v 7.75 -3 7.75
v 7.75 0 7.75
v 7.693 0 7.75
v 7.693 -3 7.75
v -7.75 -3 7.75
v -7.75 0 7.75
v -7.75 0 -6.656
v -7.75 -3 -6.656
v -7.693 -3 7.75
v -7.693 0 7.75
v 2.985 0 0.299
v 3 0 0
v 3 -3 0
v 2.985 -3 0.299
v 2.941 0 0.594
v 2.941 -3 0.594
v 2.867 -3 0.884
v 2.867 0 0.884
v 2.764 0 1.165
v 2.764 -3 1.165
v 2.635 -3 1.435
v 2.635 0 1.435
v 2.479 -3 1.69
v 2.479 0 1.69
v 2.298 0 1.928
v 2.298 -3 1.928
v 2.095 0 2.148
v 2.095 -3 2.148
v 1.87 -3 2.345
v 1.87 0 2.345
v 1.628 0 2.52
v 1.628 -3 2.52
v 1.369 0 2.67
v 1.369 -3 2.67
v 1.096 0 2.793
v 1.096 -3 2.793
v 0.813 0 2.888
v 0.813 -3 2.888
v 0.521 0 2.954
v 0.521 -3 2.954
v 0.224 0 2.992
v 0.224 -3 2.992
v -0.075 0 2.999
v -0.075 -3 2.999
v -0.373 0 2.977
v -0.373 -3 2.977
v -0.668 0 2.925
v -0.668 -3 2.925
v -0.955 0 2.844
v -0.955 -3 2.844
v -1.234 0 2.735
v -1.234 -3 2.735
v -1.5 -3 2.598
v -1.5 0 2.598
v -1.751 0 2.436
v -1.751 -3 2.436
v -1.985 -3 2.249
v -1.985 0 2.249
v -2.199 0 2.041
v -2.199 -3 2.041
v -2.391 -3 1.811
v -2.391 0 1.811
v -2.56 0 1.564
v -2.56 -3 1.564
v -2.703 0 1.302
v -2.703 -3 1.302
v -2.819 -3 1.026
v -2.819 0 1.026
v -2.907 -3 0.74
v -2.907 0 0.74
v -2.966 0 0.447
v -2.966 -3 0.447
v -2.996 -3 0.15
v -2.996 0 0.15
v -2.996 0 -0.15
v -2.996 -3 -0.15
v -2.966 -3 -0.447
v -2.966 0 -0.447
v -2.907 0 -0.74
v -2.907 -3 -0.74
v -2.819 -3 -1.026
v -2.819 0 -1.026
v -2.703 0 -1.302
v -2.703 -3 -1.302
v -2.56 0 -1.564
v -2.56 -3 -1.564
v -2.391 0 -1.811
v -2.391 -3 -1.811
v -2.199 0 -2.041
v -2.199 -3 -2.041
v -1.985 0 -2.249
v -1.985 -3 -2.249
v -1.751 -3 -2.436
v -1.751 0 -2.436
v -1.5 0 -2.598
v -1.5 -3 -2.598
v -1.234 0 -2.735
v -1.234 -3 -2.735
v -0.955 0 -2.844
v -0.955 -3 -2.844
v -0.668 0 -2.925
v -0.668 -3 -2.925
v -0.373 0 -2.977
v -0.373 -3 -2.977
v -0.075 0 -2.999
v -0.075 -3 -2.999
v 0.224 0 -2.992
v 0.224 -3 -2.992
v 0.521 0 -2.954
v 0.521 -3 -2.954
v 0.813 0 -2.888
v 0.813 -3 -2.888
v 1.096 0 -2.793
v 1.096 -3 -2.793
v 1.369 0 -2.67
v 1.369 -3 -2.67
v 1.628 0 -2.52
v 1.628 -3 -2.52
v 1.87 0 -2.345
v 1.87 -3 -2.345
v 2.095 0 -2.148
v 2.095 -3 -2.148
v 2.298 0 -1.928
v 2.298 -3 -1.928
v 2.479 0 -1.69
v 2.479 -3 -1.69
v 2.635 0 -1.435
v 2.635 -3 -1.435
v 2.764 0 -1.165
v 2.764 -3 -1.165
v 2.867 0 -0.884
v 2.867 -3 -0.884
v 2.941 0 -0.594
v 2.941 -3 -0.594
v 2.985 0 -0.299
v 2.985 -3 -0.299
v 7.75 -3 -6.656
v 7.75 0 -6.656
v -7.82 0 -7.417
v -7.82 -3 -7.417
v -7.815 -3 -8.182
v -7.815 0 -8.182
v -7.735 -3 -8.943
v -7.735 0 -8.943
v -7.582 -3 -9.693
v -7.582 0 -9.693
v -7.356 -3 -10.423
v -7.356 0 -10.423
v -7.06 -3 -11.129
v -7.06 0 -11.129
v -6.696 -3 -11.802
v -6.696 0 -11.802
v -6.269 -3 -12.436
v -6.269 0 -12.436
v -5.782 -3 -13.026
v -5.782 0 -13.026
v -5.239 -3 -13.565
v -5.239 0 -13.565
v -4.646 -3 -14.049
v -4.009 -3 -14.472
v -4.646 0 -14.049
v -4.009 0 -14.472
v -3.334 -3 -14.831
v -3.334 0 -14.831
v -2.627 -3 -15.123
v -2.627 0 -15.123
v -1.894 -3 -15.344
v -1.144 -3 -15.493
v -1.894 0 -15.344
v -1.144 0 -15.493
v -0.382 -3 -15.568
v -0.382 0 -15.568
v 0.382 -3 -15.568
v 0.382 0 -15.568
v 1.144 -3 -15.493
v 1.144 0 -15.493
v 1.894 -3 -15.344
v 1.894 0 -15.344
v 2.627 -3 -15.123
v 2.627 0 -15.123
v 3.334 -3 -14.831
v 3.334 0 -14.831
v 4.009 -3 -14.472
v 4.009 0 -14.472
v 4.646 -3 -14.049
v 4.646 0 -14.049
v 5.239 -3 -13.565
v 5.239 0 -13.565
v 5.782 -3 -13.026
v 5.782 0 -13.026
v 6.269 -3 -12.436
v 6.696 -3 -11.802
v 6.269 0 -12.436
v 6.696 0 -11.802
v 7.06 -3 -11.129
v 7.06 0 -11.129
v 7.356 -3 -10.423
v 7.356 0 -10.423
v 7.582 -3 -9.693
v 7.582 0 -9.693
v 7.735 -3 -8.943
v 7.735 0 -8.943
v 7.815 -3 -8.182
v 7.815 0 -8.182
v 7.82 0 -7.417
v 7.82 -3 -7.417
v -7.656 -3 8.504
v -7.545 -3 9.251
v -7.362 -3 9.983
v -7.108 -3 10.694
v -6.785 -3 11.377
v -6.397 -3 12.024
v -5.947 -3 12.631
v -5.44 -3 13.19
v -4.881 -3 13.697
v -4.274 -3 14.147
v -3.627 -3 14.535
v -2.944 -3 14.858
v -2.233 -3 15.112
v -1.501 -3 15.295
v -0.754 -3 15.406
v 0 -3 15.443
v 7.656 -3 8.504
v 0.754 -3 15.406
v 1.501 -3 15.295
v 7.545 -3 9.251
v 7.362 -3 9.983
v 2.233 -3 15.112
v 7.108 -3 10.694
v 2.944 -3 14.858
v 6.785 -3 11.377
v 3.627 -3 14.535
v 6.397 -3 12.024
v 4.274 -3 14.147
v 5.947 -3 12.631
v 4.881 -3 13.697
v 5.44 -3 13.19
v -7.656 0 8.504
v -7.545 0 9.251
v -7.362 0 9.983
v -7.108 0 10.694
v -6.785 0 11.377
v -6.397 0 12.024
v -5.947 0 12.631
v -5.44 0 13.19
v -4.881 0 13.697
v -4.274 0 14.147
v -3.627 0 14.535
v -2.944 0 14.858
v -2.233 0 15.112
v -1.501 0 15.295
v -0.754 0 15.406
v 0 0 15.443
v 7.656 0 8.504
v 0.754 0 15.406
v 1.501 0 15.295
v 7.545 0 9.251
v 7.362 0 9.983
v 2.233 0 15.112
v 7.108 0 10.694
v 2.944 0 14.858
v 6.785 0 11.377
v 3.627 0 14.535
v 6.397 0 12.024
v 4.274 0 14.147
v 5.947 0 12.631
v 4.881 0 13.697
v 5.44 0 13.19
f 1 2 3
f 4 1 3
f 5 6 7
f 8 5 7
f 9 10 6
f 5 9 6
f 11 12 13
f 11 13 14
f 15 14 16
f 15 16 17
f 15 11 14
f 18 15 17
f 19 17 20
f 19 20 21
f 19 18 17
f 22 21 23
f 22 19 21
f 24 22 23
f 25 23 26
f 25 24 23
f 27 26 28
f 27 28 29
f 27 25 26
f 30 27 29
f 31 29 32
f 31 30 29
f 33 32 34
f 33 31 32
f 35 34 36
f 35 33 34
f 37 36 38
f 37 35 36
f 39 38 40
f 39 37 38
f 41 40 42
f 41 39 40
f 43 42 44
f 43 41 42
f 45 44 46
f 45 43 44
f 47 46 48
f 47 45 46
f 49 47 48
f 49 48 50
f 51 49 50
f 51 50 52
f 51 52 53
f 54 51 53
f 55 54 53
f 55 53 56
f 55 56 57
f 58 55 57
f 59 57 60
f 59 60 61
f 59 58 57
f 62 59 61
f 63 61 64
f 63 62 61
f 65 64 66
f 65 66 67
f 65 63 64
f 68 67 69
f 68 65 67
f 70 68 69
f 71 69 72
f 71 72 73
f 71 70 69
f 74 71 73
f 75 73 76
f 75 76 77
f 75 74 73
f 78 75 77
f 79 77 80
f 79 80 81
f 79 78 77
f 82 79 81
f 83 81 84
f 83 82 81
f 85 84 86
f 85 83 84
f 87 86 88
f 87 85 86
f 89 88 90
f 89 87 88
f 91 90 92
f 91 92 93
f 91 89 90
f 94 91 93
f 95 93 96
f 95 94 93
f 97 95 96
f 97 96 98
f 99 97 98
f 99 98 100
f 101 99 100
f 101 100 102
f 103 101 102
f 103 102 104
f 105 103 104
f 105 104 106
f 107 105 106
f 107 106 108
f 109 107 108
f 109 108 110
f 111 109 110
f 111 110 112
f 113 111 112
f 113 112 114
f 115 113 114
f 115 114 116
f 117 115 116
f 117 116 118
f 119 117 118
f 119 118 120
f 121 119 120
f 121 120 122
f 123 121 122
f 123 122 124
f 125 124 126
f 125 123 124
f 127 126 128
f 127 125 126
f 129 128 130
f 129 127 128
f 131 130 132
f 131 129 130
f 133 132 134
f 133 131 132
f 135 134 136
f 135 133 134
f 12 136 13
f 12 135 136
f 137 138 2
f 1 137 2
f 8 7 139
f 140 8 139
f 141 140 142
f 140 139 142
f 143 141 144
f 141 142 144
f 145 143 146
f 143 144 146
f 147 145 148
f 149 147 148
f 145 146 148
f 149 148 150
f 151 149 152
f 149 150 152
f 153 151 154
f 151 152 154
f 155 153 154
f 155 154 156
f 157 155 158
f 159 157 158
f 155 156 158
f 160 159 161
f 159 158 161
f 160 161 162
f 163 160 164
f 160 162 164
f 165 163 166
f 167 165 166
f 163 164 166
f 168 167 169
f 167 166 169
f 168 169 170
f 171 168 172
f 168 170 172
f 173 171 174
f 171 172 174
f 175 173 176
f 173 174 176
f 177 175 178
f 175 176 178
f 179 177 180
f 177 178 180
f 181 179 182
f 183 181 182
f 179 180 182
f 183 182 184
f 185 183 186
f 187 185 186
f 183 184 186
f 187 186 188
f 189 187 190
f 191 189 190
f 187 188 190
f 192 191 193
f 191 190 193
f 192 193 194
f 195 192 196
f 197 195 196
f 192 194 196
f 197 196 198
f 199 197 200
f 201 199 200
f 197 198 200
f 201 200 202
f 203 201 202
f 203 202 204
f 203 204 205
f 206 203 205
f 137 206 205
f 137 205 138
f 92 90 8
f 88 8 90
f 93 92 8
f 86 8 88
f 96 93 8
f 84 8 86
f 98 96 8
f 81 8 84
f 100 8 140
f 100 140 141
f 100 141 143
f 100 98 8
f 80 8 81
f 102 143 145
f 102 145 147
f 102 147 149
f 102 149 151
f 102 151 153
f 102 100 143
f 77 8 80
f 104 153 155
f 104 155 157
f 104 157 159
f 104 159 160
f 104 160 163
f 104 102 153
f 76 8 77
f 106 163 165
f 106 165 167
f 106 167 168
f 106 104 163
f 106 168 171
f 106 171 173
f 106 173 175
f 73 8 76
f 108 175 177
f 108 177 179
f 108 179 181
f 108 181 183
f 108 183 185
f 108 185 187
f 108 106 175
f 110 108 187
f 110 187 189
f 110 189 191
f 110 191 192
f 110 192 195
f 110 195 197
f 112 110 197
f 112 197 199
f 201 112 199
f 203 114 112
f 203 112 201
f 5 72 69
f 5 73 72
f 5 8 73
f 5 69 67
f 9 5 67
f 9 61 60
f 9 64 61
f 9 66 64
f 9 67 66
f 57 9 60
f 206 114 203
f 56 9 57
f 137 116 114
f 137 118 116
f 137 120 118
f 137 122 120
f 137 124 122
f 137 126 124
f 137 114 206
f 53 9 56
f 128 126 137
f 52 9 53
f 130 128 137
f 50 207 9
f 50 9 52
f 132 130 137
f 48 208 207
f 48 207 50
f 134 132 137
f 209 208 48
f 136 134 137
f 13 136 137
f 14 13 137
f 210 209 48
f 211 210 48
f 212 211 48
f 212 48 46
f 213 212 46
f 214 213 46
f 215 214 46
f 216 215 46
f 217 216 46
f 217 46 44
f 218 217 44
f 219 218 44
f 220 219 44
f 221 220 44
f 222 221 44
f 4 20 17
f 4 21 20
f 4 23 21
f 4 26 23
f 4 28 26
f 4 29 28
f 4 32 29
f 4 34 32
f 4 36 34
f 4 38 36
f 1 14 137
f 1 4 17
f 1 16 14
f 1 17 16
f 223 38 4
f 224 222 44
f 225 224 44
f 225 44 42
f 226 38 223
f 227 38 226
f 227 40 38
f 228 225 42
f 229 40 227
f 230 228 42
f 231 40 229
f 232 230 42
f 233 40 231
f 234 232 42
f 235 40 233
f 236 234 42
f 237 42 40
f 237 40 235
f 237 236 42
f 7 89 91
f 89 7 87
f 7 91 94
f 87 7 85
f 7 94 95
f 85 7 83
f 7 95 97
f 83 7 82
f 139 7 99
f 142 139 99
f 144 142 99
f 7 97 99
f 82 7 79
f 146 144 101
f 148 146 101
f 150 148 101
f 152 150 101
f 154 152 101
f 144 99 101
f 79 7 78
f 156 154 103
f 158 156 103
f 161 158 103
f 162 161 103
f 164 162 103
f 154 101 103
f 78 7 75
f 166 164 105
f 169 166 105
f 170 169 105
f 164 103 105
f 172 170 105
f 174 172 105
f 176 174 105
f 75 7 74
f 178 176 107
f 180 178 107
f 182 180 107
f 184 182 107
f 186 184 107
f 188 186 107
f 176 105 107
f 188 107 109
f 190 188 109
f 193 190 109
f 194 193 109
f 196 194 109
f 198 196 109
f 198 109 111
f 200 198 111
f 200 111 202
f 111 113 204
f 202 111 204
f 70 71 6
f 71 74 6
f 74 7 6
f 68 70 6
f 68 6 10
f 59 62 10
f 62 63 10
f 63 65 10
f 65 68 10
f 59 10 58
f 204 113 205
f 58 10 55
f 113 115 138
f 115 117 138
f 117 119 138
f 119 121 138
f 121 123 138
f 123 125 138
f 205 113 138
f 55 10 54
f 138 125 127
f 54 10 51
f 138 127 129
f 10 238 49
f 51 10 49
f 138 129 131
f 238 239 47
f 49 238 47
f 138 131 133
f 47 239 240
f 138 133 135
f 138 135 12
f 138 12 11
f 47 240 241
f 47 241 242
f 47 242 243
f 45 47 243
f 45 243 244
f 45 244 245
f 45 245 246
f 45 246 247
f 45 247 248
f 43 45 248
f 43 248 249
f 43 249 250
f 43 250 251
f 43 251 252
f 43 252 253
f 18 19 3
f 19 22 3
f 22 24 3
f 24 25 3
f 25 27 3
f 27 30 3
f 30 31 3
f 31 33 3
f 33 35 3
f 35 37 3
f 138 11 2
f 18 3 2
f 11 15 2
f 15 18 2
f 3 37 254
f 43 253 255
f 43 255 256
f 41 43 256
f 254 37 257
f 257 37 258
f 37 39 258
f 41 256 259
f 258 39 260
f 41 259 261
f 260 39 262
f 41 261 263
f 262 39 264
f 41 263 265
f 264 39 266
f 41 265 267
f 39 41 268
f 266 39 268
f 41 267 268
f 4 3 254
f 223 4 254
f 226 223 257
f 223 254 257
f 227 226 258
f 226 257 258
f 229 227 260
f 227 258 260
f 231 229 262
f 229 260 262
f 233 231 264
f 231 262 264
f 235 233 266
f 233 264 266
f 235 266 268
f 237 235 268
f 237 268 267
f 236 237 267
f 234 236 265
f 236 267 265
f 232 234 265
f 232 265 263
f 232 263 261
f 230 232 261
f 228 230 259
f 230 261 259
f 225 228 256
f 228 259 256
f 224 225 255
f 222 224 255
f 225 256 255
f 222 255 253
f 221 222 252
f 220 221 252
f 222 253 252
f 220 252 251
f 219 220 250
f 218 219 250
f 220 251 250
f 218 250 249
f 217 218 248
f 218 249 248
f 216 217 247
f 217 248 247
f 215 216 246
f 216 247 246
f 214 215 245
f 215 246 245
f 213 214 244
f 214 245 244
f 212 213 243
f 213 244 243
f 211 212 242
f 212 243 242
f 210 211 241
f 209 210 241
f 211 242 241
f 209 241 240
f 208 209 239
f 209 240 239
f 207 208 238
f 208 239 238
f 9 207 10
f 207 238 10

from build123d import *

# Parameters (mm, degrees)
F0_R     = 3
F1_DEPTH = 3


with BuildPart() as f1:
    # F0 (on Front) → F1 (new body)
    with BuildSketch(Plane.XZ):
        with BuildLine():
            Line((7.75, -6.655555), (7.75, 7.75))
            Line((7.75, 7.75), (7.693235, 7.75))
            ThreePointArc((7.693235, 7.75), (0, 15.443235), (-7.693235, 7.75))
            Line((-7.693235, 7.75), (-7.75, 7.75))
            Line((-7.75, 7.75), (-7.75, -6.655555))
            ThreePointArc((-7.75, -6.655555), (0, -15.576897), (7.75, -6.655555))
        make_face()
        Circle(F0_R, mode=Mode.SUBTRACT)
    extrude(amount=F1_DEPTH)


solid = f1.part
